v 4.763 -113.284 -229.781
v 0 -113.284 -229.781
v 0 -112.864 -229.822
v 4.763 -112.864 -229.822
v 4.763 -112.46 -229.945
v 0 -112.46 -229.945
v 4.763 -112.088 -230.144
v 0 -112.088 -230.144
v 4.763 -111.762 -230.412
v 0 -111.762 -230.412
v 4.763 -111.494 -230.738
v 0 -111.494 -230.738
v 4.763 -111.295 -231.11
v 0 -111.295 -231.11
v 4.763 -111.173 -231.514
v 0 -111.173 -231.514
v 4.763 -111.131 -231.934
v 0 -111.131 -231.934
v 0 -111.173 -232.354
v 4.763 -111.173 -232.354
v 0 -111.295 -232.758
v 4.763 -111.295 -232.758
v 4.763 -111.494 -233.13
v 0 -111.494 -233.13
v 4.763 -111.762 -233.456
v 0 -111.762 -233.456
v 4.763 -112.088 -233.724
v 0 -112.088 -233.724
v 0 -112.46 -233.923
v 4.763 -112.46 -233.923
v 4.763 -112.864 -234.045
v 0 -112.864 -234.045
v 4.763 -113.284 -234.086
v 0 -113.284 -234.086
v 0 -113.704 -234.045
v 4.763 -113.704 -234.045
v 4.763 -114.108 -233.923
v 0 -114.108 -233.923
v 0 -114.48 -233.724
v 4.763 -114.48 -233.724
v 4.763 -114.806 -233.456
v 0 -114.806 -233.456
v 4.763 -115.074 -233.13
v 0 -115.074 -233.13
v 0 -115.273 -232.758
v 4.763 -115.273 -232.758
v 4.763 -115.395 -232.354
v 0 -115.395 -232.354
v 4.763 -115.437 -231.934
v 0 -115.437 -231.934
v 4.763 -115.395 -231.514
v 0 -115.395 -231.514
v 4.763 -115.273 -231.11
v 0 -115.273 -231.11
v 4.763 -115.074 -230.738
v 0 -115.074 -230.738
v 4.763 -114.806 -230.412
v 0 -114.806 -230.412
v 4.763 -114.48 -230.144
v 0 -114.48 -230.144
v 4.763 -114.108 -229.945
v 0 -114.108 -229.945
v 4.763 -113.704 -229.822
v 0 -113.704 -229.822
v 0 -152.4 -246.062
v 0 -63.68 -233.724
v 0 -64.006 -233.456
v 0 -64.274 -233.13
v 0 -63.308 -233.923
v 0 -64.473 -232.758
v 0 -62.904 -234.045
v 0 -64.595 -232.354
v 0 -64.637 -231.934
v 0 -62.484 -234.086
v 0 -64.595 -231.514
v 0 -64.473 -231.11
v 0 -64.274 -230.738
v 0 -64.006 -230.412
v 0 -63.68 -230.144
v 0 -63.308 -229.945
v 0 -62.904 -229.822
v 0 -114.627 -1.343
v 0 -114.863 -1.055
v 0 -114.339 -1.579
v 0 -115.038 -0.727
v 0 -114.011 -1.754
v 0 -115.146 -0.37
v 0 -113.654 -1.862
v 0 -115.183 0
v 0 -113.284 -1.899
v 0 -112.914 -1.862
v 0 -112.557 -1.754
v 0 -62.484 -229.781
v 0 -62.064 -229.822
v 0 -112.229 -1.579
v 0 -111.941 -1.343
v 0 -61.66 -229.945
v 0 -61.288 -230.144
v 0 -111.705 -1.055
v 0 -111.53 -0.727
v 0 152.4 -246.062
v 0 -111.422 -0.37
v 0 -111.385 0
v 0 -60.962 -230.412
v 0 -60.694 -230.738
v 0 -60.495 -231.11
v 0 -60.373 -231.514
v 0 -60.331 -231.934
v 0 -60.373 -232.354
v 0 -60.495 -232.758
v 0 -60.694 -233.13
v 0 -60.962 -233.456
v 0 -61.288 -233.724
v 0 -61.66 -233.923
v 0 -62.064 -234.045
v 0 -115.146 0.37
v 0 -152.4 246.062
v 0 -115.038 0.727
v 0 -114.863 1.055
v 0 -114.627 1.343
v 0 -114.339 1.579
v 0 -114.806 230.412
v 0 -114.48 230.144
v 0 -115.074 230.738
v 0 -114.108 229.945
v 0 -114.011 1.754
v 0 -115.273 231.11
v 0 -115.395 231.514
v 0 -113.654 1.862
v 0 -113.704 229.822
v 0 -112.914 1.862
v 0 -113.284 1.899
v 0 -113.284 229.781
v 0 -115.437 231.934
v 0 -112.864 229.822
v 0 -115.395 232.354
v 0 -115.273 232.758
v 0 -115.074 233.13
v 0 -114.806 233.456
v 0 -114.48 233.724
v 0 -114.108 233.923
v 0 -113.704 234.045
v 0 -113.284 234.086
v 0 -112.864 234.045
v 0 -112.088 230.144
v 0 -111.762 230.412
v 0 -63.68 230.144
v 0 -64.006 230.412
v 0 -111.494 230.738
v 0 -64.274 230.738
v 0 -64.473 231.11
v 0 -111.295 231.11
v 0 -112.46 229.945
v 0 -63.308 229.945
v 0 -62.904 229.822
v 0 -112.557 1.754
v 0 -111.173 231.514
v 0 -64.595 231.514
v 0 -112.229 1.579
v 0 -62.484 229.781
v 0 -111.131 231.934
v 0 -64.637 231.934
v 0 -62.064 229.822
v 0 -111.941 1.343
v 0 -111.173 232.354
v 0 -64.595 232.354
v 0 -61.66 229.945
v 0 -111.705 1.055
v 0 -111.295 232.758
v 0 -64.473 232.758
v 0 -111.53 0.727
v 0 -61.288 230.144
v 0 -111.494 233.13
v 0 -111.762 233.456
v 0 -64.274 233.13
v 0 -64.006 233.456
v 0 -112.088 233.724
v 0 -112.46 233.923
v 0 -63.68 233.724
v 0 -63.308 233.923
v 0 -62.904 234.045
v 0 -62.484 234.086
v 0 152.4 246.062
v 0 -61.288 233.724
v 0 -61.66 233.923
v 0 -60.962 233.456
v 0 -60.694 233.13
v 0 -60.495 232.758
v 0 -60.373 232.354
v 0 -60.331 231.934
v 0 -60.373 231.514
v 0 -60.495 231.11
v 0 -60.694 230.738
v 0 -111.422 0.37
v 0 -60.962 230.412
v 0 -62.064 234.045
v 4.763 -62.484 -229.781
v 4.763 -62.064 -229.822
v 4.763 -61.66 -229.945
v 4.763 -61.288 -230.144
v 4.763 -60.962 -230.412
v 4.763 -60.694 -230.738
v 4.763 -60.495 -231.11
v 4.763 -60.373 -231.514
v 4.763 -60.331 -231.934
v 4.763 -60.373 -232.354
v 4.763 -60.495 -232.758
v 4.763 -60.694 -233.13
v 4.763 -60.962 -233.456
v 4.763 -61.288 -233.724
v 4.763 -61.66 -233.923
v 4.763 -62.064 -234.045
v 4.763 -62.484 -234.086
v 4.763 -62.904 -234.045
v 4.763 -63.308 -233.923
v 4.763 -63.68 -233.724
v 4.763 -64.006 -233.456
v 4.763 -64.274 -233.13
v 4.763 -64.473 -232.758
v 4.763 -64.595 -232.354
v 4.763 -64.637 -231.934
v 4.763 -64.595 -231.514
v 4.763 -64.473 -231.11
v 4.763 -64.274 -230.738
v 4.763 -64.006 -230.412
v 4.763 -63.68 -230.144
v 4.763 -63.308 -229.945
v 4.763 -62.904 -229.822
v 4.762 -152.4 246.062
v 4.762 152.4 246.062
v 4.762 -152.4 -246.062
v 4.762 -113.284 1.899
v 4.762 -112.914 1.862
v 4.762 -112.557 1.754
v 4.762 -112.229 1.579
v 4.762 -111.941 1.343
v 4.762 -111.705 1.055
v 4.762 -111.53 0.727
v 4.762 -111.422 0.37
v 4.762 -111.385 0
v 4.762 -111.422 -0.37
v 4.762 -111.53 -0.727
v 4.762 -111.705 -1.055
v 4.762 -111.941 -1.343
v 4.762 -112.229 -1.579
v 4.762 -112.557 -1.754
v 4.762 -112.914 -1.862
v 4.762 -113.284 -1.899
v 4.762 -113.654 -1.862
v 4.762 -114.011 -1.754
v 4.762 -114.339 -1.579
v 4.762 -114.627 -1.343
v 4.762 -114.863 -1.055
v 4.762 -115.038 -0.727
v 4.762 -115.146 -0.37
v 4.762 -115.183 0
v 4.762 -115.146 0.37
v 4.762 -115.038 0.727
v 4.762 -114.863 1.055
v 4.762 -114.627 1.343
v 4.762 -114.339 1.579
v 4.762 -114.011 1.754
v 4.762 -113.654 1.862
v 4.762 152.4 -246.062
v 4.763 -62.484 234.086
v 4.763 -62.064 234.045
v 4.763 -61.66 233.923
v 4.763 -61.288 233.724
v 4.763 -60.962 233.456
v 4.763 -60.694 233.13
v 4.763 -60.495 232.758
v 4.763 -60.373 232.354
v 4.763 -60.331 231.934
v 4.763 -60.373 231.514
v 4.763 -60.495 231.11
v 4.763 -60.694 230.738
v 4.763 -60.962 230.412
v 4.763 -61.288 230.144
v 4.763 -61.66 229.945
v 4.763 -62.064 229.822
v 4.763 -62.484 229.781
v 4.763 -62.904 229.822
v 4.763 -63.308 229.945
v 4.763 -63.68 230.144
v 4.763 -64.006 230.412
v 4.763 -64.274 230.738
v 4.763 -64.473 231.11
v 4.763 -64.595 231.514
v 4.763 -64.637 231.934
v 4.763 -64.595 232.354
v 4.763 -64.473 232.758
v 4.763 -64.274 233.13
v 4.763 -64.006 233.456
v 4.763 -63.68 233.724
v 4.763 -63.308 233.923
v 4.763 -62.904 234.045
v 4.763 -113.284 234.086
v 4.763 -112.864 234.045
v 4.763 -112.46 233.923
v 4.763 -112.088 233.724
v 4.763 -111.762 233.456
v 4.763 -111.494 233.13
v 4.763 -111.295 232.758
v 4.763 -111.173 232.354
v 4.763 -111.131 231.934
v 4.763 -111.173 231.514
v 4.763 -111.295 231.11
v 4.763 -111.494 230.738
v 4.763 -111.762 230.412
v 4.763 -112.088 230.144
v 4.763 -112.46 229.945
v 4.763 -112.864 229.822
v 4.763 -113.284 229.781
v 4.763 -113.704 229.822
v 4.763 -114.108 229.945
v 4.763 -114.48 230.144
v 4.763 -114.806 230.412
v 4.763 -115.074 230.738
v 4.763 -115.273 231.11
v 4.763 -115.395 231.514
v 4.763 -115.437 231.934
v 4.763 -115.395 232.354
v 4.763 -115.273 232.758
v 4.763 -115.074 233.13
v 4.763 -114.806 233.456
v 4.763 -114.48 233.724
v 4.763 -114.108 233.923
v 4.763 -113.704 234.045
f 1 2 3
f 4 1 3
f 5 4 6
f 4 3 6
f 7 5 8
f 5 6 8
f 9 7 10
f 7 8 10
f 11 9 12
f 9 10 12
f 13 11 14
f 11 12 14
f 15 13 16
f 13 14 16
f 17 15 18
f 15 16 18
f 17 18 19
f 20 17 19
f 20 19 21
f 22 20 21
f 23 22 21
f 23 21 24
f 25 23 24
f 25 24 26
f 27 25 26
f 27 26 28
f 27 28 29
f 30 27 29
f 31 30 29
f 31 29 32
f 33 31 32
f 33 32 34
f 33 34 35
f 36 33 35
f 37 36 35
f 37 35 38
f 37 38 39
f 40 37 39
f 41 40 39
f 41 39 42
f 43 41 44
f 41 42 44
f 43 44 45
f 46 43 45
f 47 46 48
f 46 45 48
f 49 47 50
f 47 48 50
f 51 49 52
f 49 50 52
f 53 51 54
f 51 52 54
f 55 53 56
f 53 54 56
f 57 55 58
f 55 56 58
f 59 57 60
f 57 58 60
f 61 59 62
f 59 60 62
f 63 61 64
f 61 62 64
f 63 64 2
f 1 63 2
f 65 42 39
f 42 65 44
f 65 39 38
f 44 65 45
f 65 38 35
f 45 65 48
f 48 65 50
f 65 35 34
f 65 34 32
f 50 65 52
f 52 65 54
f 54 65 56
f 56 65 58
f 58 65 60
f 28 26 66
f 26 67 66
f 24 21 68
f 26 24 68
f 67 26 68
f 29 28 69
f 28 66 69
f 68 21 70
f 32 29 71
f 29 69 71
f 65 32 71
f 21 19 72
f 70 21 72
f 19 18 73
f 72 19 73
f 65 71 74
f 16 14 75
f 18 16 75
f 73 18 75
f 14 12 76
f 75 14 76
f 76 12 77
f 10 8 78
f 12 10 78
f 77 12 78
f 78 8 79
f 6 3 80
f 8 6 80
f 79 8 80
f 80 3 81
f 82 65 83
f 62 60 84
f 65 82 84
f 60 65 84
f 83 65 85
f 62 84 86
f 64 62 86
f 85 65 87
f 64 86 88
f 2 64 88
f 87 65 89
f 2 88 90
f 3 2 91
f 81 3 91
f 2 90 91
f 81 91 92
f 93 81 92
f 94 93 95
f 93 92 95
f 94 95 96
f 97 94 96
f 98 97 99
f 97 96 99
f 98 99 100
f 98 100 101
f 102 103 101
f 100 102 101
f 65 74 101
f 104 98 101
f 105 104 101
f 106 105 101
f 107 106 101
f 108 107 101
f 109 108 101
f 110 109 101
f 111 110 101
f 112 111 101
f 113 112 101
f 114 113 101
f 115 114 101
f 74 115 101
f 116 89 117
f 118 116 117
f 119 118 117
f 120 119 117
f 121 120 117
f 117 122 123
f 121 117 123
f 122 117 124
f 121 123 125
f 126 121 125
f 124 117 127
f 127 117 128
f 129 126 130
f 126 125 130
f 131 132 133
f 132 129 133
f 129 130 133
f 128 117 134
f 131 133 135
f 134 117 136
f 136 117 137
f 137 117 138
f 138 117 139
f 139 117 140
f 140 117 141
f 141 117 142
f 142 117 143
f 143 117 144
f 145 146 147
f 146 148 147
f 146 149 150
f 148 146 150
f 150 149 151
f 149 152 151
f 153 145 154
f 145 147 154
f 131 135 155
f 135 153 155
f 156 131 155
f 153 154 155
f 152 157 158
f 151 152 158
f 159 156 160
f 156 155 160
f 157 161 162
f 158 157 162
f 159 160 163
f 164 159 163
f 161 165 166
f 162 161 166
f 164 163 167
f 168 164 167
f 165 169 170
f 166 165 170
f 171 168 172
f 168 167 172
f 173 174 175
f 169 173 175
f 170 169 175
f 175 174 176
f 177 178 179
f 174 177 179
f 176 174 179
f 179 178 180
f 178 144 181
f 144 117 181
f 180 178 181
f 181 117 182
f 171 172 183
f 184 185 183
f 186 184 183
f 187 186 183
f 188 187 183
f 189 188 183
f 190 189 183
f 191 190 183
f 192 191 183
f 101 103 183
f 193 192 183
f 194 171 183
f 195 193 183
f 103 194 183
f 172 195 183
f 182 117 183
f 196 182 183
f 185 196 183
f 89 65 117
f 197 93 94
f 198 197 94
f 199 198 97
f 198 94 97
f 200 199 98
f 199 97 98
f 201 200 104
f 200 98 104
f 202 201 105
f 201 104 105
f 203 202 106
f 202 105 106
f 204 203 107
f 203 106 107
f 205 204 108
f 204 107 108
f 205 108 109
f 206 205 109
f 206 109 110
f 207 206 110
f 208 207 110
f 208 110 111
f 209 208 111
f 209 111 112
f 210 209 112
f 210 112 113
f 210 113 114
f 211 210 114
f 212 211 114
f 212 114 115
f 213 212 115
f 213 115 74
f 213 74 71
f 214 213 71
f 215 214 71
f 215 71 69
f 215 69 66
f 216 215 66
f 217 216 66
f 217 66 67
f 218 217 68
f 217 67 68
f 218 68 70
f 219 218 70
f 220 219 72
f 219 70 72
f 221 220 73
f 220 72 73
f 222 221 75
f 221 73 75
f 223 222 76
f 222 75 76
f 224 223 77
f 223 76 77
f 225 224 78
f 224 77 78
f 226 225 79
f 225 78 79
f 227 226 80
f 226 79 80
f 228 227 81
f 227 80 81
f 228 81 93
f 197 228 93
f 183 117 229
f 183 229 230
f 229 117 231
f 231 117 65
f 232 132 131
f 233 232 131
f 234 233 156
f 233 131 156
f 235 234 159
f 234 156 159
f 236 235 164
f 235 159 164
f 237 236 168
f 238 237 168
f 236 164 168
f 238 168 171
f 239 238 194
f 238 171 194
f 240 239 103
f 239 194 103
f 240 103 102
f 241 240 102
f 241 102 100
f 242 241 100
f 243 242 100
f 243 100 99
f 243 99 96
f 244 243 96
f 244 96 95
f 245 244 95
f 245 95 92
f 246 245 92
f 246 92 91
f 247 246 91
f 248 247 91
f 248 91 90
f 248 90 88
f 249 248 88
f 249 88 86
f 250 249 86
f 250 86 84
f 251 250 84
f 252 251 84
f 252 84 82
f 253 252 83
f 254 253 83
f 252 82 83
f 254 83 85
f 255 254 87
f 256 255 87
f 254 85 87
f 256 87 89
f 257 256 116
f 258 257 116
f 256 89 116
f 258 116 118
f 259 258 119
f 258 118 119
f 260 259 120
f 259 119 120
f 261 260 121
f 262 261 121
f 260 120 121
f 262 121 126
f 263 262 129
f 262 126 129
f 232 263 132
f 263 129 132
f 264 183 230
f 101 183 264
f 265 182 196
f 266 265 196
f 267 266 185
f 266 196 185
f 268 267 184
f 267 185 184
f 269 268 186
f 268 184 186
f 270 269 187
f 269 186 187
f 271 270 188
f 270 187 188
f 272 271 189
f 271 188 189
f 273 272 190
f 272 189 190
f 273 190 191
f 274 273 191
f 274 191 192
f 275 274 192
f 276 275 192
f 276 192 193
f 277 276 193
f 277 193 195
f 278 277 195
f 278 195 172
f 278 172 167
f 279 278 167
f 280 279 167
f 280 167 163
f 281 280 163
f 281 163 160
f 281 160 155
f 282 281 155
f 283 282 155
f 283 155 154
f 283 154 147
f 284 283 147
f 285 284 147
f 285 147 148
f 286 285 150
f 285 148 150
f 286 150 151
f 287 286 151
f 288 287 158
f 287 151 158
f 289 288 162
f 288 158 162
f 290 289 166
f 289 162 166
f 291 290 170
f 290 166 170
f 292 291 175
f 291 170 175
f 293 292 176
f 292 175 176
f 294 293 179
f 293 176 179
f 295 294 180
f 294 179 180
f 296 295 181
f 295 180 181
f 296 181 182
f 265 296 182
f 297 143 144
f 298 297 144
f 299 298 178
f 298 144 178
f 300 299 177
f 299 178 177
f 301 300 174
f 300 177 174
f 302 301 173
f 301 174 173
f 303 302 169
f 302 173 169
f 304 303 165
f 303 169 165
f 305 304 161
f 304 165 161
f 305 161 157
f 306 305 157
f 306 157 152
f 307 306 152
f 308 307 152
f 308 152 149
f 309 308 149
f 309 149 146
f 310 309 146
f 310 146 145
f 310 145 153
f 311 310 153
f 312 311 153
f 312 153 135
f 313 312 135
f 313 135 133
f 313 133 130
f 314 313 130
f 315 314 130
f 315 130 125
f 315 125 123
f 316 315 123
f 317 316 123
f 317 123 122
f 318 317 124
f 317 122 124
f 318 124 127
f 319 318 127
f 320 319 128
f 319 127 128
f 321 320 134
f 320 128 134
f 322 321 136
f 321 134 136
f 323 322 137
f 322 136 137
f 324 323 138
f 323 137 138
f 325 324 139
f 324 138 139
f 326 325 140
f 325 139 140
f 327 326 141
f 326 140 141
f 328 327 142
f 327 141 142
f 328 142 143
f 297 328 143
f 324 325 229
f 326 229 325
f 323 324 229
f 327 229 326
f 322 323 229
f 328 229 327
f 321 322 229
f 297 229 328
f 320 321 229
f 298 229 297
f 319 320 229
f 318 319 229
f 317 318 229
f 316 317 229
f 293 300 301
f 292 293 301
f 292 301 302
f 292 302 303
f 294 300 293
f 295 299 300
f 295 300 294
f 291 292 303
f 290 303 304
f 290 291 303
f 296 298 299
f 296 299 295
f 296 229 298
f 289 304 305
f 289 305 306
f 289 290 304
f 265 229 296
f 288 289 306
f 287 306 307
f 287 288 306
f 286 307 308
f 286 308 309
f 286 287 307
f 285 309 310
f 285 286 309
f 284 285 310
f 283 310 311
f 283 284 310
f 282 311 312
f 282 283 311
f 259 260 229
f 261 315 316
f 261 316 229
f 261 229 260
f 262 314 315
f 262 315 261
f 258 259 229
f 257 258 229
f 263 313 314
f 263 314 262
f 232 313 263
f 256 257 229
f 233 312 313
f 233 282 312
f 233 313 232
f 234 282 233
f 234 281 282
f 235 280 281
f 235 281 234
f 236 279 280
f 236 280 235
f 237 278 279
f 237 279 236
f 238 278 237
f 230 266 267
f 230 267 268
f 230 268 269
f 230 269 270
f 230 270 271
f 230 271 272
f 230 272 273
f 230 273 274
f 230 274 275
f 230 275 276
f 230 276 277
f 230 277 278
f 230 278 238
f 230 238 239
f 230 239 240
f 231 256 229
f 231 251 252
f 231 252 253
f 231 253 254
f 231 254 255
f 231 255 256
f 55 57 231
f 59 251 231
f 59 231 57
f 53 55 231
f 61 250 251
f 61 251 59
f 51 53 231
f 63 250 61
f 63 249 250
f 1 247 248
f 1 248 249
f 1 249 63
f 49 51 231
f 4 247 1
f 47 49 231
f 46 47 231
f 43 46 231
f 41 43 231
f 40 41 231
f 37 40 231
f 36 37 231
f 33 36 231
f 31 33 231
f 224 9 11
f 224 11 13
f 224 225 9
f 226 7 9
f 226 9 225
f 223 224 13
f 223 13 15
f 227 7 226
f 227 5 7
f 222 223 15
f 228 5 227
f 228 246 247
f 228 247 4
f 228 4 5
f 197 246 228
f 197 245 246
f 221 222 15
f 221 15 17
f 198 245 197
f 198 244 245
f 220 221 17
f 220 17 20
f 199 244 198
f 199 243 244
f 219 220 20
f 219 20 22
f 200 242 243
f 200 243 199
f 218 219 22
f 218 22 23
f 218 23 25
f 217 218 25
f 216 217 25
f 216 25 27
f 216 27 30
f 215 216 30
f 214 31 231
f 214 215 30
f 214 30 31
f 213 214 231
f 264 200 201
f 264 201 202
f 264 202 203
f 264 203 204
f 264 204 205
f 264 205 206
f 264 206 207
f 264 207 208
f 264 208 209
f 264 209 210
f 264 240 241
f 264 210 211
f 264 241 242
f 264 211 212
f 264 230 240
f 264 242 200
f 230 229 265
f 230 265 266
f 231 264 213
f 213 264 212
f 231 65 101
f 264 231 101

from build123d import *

# Parameters (mm, degrees)
SKETCH1_W                 = 492.125
SKETCH1_H                 = 304.8
BOSS_EXTRUDE1_DEPTH       = 4.7625
CUT_EXTRUDE1_REACH        = 6.763
BOSS_EXTRUDE2_REACH       = 494.125
SKETCH3_W                 = 4.7625
SKETCH3_H                 = 304.8
F_8_CLEARANCE_HOLE1_D     = 4.3053
F_8_CLEARANCE_HOLE1_DEPTH = 74.422
F_8_CLEARANCE_HOLE1_TIP   = 1.293442612
F_6_CLEARANCE_HOLE1_D     = 3.7973
F_6_CLEARANCE_HOLE1_DEPTH = 25.4
F_6_CLEARANCE_HOLE1_TIP   = 1.140824014


with BuildPart() as part:
    # Sketch1 → Boss-Extrude1 (new body)
    with BuildSketch(Plane(origin=(0, 0, 0), x_dir=(0, 0, -1), z_dir=(1, 0, 0))):
        Rectangle(SKETCH1_W, SKETCH1_H)
    extrude(amount=BOSS_EXTRUDE1_DEPTH)

    # Sketch2 → Cut-Extrude1 (cut, up to next)
    with BuildSketch(Plane(origin=(4.7625, 0, 0), x_dir=(0, 0, -1), z_dir=(1, 0, 0)), mode=Mode.PRIVATE) as cut_extrude1_sk1:
        Polygon((-24.852813742, -60), (24.852813742, -60), (42.426406871, -42.426406871), (60, -24.852813742), (60, 24.852813742), (24.852813742, 60), (-24.852813742, 60), (-60, 24.852813742), (-60, -24.852813742), align=None)
    cut_extrude1_tool1 = extrude(cut_extrude1_sk1.sketch, amount=-CUT_EXTRUDE1_REACH, mode=Mode.PRIVATE) & part.part
    add(cut_extrude1_tool1.solids().sort_by_distance((4.7625, 0, 0))[0], mode=Mode.SUBTRACT)

    # Sketch3 → Boss-Extrude2 (add, up to next)
    with BuildSketch(Plane.XY.offset(246.0625), mode=Mode.PRIVATE) as boss_extrude2_sk1:
        with Locations((2.38125, 0)):
            Rectangle(SKETCH3_W, SKETCH3_H)
    boss_extrude2_tool1 = extrude(boss_extrude2_sk1.sketch, amount=-BOSS_EXTRUDE2_REACH, mode=Mode.PRIVATE) - part.part
    add(boss_extrude2_tool1.solids().sort_by_distance((2.38125, 0, 246.0625))[0])

    # #8 Clearance Hole1
    with Locations(Plane(origin=(4.7625, 0, 0), x_dir=(0, 0, -1), z_dir=(1, 0, 0))):
        with Locations((-231.93375, -113.284), (-231.93375, -62.484), (231.93375, -62.484), (231.93375, -113.284)):
            Hole(F_8_CLEARANCE_HOLE1_D / 2, depth=F_8_CLEARANCE_HOLE1_DEPTH)
            with Locations((0, 0, -(F_8_CLEARANCE_HOLE1_DEPTH + F_8_CLEARANCE_HOLE1_TIP / 2))):  # 118° drill point
                Cone(0, F_8_CLEARANCE_HOLE1_D / 2, F_8_CLEARANCE_HOLE1_TIP, mode=Mode.SUBTRACT)

    # #6 Clearance Hole1
    with Locations(Plane(origin=(4.7625, 0, 0), x_dir=(0, 0, -1), z_dir=(1, 0, 0))):
        with Locations((0, -113.284)):
            Hole(F_6_CLEARANCE_HOLE1_D / 2, depth=F_6_CLEARANCE_HOLE1_DEPTH)
            with Locations((0, 0, -(F_6_CLEARANCE_HOLE1_DEPTH + F_6_CLEARANCE_HOLE1_TIP / 2))):  # 118° drill point
                Cone(0, F_6_CLEARANCE_HOLE1_D / 2, F_6_CLEARANCE_HOLE1_TIP, mode=Mode.SUBTRACT)


solid = part.part
